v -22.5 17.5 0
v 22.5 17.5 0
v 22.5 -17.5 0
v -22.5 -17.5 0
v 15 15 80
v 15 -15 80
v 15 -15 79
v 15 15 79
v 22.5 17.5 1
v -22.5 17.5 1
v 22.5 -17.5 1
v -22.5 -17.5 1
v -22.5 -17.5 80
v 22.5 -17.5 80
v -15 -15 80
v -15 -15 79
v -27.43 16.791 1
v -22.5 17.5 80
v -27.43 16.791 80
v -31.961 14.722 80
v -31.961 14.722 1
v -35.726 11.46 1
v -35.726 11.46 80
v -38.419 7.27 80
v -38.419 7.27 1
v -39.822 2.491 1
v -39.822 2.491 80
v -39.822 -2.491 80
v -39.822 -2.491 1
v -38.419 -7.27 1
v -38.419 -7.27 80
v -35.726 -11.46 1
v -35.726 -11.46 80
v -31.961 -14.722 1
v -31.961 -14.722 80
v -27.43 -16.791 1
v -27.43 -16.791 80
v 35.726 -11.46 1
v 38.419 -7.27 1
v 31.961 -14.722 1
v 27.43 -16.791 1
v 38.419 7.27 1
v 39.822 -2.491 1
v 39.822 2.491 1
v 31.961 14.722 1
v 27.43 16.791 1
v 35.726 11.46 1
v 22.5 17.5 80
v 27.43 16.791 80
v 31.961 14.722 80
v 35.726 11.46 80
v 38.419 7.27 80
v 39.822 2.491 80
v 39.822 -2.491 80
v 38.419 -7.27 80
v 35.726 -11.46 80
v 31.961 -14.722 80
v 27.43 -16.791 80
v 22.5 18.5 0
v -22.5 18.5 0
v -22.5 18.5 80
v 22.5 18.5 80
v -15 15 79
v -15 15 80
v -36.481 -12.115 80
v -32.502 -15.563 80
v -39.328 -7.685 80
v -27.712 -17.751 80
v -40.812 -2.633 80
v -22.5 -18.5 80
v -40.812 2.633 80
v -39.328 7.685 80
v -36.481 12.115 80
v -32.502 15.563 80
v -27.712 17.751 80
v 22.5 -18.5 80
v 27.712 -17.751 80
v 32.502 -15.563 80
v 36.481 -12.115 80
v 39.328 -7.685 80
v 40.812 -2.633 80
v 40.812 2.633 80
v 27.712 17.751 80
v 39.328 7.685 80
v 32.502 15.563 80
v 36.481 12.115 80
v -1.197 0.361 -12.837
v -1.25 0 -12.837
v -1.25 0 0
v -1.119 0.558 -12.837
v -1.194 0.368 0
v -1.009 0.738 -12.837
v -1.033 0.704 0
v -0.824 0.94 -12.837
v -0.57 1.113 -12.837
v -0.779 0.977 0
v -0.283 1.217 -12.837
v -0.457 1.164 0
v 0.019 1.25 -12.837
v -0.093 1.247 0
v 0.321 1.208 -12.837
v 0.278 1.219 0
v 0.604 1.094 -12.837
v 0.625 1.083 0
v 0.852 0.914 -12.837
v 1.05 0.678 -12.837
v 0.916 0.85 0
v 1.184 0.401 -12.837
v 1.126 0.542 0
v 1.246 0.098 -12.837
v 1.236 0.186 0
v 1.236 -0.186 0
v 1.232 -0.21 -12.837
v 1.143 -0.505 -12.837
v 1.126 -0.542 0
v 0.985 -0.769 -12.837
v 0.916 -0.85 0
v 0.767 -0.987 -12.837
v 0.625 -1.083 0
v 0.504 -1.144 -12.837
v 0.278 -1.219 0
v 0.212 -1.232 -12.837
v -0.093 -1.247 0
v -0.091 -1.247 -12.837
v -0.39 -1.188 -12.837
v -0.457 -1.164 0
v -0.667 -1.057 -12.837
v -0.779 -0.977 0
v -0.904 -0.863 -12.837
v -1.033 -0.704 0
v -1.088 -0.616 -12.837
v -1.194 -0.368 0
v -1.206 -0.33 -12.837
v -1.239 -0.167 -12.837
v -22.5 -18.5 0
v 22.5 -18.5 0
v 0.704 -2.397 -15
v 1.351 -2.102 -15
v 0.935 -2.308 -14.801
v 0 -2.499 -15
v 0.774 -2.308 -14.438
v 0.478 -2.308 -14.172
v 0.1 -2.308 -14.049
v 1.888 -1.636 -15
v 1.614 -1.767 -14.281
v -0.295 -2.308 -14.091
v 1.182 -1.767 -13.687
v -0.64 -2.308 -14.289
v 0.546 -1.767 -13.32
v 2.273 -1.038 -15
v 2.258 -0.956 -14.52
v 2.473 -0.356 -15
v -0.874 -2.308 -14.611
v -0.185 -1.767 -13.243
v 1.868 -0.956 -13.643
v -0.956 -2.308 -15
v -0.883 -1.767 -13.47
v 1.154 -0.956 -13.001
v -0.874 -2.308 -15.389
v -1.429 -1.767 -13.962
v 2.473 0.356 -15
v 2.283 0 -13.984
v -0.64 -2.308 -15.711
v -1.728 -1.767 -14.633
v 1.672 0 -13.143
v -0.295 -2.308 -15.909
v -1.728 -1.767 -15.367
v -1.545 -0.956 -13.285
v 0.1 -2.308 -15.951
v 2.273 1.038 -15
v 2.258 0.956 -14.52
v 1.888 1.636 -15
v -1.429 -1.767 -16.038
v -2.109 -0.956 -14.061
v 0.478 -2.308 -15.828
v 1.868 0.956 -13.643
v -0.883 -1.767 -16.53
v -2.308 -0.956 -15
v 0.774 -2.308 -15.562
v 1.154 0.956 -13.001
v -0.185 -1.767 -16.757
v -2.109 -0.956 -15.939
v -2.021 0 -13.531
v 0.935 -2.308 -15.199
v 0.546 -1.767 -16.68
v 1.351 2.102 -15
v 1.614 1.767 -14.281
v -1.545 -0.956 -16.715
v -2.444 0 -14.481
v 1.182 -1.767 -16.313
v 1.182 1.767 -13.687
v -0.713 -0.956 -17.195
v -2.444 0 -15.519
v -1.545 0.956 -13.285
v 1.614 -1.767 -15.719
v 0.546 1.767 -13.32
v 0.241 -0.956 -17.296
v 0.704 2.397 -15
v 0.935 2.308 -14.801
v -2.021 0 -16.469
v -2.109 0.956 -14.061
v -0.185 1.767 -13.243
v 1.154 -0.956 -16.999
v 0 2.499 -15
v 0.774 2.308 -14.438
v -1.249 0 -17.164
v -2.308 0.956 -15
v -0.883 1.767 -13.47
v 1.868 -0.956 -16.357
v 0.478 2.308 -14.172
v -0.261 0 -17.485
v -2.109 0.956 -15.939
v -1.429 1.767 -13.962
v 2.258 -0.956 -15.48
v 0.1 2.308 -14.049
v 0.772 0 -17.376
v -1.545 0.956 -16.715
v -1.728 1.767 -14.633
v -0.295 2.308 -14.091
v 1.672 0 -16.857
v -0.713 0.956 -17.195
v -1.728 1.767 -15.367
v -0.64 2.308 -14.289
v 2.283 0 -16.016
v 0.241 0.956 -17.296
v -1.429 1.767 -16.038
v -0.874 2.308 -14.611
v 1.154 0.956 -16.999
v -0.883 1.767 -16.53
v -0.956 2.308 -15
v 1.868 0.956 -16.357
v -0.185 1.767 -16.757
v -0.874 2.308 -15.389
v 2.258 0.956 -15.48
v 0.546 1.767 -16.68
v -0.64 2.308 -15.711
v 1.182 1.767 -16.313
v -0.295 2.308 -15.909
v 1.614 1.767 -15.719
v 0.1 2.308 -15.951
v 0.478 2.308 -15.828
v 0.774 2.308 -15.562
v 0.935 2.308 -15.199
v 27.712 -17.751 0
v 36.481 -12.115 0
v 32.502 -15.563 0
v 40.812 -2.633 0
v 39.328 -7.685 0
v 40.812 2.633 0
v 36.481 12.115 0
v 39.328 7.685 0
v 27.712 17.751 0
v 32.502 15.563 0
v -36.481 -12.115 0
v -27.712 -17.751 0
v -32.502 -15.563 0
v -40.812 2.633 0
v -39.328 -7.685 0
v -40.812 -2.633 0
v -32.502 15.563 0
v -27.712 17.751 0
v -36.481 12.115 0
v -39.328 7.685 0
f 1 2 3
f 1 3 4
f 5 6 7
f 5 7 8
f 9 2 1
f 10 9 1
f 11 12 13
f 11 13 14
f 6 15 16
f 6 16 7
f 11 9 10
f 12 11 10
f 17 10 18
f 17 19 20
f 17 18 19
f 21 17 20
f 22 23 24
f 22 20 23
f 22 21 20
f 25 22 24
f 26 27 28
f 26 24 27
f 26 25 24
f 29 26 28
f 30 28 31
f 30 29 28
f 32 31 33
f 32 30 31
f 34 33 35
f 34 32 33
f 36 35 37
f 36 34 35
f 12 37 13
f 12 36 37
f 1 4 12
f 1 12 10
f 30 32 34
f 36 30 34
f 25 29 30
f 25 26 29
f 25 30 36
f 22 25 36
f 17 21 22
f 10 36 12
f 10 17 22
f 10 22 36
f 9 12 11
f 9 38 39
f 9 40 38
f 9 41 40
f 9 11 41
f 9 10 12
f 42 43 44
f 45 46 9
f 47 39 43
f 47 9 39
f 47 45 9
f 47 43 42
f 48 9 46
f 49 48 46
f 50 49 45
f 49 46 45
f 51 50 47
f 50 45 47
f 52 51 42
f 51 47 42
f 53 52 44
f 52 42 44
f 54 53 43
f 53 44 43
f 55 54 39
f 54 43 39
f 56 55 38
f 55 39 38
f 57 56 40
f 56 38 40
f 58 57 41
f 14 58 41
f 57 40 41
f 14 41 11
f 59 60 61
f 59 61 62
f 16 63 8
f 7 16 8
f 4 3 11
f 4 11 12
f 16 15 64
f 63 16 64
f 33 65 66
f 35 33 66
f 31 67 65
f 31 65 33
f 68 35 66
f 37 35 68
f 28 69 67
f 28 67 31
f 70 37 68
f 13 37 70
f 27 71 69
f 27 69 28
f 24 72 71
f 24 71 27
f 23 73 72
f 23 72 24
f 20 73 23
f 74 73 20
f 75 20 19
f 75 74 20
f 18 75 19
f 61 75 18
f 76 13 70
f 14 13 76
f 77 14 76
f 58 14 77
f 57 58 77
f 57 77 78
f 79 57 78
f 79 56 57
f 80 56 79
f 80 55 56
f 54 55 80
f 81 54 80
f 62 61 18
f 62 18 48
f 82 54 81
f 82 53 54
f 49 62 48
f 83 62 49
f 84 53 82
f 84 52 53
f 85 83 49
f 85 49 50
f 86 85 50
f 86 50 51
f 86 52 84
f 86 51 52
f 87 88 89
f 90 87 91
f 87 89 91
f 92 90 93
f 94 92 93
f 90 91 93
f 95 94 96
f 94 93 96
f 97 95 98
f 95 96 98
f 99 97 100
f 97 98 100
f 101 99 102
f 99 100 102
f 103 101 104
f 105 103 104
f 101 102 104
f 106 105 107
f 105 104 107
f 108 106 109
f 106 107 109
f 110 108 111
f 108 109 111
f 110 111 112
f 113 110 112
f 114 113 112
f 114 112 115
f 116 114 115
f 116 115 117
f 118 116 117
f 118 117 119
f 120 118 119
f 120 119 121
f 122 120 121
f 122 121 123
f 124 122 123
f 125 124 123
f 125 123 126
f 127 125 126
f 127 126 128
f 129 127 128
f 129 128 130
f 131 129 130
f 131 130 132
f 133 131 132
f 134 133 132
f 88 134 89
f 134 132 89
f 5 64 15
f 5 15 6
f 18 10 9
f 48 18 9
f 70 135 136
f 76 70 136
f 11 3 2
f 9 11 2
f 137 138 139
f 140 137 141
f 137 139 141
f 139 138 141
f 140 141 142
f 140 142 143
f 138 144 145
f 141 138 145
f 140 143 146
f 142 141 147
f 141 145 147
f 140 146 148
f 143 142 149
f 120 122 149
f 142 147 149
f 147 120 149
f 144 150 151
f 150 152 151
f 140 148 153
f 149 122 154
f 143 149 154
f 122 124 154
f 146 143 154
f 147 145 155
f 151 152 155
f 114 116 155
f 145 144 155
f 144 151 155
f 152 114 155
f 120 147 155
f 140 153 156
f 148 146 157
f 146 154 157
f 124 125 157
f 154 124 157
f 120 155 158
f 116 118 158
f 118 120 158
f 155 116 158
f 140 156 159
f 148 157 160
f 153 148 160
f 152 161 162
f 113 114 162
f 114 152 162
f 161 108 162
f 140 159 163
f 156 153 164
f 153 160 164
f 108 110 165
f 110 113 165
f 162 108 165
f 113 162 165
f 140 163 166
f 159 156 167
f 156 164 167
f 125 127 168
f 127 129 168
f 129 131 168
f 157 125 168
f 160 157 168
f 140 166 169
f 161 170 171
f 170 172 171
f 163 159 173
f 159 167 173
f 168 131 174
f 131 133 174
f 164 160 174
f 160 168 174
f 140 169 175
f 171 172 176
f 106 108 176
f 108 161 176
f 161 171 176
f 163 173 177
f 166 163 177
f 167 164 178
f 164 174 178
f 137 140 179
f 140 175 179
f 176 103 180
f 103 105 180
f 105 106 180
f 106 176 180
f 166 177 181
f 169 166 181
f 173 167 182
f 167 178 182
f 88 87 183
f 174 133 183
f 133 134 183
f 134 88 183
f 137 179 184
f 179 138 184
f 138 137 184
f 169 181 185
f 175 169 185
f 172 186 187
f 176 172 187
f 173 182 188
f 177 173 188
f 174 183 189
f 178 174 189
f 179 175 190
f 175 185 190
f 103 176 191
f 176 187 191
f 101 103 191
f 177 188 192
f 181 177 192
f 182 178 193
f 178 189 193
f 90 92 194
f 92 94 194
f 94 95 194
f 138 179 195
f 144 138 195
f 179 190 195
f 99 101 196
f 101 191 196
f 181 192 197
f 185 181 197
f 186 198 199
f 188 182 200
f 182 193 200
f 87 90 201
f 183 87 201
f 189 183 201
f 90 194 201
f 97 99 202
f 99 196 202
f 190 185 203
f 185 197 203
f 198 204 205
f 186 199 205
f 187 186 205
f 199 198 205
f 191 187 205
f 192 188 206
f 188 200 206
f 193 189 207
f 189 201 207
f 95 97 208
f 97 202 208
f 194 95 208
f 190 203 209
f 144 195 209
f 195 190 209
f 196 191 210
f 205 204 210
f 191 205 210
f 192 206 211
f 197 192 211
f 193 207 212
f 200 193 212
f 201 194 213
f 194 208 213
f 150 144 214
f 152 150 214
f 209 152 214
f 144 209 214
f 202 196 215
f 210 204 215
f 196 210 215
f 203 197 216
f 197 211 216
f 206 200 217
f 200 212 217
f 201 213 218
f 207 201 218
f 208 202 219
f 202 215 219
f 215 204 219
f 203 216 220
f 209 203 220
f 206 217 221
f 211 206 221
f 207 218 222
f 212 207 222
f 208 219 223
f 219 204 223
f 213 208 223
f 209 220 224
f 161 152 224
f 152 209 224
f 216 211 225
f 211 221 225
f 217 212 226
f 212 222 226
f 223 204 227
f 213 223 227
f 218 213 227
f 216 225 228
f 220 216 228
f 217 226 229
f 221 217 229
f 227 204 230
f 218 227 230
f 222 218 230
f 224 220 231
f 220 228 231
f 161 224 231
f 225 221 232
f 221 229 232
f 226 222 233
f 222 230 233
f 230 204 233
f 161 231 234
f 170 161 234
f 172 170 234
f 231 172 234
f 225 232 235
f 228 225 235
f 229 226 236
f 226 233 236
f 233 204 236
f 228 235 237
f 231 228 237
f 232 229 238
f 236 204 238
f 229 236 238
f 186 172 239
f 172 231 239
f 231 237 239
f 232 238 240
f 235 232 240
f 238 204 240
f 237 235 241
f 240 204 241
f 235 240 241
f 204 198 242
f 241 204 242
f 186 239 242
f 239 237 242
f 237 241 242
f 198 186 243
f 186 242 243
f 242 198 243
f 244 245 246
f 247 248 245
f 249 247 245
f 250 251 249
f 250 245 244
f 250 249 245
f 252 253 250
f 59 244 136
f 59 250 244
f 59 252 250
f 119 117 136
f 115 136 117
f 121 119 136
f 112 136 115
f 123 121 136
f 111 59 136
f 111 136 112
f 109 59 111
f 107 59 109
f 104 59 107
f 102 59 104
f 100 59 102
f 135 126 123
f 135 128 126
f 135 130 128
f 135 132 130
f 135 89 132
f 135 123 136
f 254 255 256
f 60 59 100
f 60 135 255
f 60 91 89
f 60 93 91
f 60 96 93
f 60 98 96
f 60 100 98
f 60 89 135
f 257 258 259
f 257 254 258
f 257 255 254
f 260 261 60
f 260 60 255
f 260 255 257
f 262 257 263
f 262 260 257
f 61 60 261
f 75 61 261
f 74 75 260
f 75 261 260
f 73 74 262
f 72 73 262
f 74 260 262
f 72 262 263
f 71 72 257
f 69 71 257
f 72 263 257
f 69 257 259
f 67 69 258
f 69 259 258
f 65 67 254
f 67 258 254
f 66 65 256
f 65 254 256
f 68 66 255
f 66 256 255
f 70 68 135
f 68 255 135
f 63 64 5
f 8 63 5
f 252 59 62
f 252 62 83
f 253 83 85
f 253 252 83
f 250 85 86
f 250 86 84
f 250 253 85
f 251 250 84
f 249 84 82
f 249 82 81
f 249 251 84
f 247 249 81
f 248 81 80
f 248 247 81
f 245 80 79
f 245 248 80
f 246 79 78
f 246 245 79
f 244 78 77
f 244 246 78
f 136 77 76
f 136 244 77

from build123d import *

# Parameters (mm, degrees)
SKETCH1_W           = 45
SKETCH1_H           = 37
BOSS_EXTRUDE1_DEPTH = 80
SHELL1_T            = -1
SKETCH2_W           = 45
SKETCH2_H           = 35
BOSS_EXTRUDE2_DEPTH = 1
SKETCH3_R           = 1.25
BOSS_EXTRUDE3_DEPTH = 15
SKETCH6_W           = 45
SKETCH6_H           = 35
BOSS_EXTRUDE4_DEPTH = 1
SKETCH7_W           = 30
SKETCH7_H           = 30
BOSS_EXTRUDE5_DEPTH = 1


with BuildPart() as part:
    # Sketch1 → Boss-Extrude1 (new body)
    with BuildSketch(Plane.XY):
        Rectangle(SKETCH1_W, SKETCH1_H)
        with BuildLine():
            ThreePointArc((22.5, 18.5), (41, 0), (22.5, -18.5))
            Line((22.5, -18.5), (22.5, 18.5))
        make_face()
        with BuildLine():
            Line((-22.5, -18.5), (-22.5, 18.5))
            ThreePointArc((-22.5, 18.5), (-41, 0), (-22.5, -18.5))
        make_face()
    extrude(amount=BOSS_EXTRUDE1_DEPTH)

    # Shell1
    shell1_openings = [part.faces().sort_by_distance(p)[0] for p in [
        (0, 0, 80),
    ]]
    offset(amount=SHELL1_T, openings=shell1_openings, kind=Kind.INTERSECTION)



with BuildPart() as body_2:
    # Sketch2 → Boss-Extrude2 (new body)
    with BuildSketch(Plane(origin=(0, 0, 0), x_dir=(-1, 0, 0), z_dir=(0, 0, -1))):
        Rectangle(SKETCH2_W, SKETCH2_H)
    extrude(amount=-BOSS_EXTRUDE2_DEPTH)


with BuildPart() as part_1:
    add(part.part)

    add(body_2.part)  # Boss-Extrude3 merges body 2
    # Sketch3 → Boss-Extrude3 (add)
    with BuildSketch(Plane(origin=(0, 0, 0), x_dir=(-1, 0, 0), z_dir=(0, 0, -1))):
        Circle(SKETCH3_R)
    extrude(amount=BOSS_EXTRUDE3_DEPTH)

    # Sketch5 → Revolve1 (revolve)
    with BuildSketch(Plane(origin=(0, 0, -15), x_dir=(-1, 0, 0), z_dir=(0, 0, -1))):
        with BuildLine():
            Line((0, 2.498582247), (0, -2.498582247))
            ThreePointArc((0, -2.498582247), (-2.498582247, 0), (0, 2.498582247))
        make_face()
    revolve(axis=Axis((0, 2.498582247, -15), (0, -1, 0)))


with BuildPart() as body_2_2:
    # Sketch6 → Boss-Extrude4 (new body)
    with BuildSketch(Plane(origin=(0, 0, 0), x_dir=(-1, 0, 0), z_dir=(0, 0, -1))):
        Rectangle(SKETCH6_W, SKETCH6_H)
    extrude(amount=-BOSS_EXTRUDE4_DEPTH)


with BuildPart() as body_3:
    # Sketch7 → Boss-Extrude5 (new body)
    with BuildSketch(Plane.XY.offset(80)):
        Rectangle(SKETCH7_W, SKETCH7_H)
    extrude(amount=-BOSS_EXTRUDE5_DEPTH)


solid = Compound([part_1.part, body_2_2.part, body_3.part])
